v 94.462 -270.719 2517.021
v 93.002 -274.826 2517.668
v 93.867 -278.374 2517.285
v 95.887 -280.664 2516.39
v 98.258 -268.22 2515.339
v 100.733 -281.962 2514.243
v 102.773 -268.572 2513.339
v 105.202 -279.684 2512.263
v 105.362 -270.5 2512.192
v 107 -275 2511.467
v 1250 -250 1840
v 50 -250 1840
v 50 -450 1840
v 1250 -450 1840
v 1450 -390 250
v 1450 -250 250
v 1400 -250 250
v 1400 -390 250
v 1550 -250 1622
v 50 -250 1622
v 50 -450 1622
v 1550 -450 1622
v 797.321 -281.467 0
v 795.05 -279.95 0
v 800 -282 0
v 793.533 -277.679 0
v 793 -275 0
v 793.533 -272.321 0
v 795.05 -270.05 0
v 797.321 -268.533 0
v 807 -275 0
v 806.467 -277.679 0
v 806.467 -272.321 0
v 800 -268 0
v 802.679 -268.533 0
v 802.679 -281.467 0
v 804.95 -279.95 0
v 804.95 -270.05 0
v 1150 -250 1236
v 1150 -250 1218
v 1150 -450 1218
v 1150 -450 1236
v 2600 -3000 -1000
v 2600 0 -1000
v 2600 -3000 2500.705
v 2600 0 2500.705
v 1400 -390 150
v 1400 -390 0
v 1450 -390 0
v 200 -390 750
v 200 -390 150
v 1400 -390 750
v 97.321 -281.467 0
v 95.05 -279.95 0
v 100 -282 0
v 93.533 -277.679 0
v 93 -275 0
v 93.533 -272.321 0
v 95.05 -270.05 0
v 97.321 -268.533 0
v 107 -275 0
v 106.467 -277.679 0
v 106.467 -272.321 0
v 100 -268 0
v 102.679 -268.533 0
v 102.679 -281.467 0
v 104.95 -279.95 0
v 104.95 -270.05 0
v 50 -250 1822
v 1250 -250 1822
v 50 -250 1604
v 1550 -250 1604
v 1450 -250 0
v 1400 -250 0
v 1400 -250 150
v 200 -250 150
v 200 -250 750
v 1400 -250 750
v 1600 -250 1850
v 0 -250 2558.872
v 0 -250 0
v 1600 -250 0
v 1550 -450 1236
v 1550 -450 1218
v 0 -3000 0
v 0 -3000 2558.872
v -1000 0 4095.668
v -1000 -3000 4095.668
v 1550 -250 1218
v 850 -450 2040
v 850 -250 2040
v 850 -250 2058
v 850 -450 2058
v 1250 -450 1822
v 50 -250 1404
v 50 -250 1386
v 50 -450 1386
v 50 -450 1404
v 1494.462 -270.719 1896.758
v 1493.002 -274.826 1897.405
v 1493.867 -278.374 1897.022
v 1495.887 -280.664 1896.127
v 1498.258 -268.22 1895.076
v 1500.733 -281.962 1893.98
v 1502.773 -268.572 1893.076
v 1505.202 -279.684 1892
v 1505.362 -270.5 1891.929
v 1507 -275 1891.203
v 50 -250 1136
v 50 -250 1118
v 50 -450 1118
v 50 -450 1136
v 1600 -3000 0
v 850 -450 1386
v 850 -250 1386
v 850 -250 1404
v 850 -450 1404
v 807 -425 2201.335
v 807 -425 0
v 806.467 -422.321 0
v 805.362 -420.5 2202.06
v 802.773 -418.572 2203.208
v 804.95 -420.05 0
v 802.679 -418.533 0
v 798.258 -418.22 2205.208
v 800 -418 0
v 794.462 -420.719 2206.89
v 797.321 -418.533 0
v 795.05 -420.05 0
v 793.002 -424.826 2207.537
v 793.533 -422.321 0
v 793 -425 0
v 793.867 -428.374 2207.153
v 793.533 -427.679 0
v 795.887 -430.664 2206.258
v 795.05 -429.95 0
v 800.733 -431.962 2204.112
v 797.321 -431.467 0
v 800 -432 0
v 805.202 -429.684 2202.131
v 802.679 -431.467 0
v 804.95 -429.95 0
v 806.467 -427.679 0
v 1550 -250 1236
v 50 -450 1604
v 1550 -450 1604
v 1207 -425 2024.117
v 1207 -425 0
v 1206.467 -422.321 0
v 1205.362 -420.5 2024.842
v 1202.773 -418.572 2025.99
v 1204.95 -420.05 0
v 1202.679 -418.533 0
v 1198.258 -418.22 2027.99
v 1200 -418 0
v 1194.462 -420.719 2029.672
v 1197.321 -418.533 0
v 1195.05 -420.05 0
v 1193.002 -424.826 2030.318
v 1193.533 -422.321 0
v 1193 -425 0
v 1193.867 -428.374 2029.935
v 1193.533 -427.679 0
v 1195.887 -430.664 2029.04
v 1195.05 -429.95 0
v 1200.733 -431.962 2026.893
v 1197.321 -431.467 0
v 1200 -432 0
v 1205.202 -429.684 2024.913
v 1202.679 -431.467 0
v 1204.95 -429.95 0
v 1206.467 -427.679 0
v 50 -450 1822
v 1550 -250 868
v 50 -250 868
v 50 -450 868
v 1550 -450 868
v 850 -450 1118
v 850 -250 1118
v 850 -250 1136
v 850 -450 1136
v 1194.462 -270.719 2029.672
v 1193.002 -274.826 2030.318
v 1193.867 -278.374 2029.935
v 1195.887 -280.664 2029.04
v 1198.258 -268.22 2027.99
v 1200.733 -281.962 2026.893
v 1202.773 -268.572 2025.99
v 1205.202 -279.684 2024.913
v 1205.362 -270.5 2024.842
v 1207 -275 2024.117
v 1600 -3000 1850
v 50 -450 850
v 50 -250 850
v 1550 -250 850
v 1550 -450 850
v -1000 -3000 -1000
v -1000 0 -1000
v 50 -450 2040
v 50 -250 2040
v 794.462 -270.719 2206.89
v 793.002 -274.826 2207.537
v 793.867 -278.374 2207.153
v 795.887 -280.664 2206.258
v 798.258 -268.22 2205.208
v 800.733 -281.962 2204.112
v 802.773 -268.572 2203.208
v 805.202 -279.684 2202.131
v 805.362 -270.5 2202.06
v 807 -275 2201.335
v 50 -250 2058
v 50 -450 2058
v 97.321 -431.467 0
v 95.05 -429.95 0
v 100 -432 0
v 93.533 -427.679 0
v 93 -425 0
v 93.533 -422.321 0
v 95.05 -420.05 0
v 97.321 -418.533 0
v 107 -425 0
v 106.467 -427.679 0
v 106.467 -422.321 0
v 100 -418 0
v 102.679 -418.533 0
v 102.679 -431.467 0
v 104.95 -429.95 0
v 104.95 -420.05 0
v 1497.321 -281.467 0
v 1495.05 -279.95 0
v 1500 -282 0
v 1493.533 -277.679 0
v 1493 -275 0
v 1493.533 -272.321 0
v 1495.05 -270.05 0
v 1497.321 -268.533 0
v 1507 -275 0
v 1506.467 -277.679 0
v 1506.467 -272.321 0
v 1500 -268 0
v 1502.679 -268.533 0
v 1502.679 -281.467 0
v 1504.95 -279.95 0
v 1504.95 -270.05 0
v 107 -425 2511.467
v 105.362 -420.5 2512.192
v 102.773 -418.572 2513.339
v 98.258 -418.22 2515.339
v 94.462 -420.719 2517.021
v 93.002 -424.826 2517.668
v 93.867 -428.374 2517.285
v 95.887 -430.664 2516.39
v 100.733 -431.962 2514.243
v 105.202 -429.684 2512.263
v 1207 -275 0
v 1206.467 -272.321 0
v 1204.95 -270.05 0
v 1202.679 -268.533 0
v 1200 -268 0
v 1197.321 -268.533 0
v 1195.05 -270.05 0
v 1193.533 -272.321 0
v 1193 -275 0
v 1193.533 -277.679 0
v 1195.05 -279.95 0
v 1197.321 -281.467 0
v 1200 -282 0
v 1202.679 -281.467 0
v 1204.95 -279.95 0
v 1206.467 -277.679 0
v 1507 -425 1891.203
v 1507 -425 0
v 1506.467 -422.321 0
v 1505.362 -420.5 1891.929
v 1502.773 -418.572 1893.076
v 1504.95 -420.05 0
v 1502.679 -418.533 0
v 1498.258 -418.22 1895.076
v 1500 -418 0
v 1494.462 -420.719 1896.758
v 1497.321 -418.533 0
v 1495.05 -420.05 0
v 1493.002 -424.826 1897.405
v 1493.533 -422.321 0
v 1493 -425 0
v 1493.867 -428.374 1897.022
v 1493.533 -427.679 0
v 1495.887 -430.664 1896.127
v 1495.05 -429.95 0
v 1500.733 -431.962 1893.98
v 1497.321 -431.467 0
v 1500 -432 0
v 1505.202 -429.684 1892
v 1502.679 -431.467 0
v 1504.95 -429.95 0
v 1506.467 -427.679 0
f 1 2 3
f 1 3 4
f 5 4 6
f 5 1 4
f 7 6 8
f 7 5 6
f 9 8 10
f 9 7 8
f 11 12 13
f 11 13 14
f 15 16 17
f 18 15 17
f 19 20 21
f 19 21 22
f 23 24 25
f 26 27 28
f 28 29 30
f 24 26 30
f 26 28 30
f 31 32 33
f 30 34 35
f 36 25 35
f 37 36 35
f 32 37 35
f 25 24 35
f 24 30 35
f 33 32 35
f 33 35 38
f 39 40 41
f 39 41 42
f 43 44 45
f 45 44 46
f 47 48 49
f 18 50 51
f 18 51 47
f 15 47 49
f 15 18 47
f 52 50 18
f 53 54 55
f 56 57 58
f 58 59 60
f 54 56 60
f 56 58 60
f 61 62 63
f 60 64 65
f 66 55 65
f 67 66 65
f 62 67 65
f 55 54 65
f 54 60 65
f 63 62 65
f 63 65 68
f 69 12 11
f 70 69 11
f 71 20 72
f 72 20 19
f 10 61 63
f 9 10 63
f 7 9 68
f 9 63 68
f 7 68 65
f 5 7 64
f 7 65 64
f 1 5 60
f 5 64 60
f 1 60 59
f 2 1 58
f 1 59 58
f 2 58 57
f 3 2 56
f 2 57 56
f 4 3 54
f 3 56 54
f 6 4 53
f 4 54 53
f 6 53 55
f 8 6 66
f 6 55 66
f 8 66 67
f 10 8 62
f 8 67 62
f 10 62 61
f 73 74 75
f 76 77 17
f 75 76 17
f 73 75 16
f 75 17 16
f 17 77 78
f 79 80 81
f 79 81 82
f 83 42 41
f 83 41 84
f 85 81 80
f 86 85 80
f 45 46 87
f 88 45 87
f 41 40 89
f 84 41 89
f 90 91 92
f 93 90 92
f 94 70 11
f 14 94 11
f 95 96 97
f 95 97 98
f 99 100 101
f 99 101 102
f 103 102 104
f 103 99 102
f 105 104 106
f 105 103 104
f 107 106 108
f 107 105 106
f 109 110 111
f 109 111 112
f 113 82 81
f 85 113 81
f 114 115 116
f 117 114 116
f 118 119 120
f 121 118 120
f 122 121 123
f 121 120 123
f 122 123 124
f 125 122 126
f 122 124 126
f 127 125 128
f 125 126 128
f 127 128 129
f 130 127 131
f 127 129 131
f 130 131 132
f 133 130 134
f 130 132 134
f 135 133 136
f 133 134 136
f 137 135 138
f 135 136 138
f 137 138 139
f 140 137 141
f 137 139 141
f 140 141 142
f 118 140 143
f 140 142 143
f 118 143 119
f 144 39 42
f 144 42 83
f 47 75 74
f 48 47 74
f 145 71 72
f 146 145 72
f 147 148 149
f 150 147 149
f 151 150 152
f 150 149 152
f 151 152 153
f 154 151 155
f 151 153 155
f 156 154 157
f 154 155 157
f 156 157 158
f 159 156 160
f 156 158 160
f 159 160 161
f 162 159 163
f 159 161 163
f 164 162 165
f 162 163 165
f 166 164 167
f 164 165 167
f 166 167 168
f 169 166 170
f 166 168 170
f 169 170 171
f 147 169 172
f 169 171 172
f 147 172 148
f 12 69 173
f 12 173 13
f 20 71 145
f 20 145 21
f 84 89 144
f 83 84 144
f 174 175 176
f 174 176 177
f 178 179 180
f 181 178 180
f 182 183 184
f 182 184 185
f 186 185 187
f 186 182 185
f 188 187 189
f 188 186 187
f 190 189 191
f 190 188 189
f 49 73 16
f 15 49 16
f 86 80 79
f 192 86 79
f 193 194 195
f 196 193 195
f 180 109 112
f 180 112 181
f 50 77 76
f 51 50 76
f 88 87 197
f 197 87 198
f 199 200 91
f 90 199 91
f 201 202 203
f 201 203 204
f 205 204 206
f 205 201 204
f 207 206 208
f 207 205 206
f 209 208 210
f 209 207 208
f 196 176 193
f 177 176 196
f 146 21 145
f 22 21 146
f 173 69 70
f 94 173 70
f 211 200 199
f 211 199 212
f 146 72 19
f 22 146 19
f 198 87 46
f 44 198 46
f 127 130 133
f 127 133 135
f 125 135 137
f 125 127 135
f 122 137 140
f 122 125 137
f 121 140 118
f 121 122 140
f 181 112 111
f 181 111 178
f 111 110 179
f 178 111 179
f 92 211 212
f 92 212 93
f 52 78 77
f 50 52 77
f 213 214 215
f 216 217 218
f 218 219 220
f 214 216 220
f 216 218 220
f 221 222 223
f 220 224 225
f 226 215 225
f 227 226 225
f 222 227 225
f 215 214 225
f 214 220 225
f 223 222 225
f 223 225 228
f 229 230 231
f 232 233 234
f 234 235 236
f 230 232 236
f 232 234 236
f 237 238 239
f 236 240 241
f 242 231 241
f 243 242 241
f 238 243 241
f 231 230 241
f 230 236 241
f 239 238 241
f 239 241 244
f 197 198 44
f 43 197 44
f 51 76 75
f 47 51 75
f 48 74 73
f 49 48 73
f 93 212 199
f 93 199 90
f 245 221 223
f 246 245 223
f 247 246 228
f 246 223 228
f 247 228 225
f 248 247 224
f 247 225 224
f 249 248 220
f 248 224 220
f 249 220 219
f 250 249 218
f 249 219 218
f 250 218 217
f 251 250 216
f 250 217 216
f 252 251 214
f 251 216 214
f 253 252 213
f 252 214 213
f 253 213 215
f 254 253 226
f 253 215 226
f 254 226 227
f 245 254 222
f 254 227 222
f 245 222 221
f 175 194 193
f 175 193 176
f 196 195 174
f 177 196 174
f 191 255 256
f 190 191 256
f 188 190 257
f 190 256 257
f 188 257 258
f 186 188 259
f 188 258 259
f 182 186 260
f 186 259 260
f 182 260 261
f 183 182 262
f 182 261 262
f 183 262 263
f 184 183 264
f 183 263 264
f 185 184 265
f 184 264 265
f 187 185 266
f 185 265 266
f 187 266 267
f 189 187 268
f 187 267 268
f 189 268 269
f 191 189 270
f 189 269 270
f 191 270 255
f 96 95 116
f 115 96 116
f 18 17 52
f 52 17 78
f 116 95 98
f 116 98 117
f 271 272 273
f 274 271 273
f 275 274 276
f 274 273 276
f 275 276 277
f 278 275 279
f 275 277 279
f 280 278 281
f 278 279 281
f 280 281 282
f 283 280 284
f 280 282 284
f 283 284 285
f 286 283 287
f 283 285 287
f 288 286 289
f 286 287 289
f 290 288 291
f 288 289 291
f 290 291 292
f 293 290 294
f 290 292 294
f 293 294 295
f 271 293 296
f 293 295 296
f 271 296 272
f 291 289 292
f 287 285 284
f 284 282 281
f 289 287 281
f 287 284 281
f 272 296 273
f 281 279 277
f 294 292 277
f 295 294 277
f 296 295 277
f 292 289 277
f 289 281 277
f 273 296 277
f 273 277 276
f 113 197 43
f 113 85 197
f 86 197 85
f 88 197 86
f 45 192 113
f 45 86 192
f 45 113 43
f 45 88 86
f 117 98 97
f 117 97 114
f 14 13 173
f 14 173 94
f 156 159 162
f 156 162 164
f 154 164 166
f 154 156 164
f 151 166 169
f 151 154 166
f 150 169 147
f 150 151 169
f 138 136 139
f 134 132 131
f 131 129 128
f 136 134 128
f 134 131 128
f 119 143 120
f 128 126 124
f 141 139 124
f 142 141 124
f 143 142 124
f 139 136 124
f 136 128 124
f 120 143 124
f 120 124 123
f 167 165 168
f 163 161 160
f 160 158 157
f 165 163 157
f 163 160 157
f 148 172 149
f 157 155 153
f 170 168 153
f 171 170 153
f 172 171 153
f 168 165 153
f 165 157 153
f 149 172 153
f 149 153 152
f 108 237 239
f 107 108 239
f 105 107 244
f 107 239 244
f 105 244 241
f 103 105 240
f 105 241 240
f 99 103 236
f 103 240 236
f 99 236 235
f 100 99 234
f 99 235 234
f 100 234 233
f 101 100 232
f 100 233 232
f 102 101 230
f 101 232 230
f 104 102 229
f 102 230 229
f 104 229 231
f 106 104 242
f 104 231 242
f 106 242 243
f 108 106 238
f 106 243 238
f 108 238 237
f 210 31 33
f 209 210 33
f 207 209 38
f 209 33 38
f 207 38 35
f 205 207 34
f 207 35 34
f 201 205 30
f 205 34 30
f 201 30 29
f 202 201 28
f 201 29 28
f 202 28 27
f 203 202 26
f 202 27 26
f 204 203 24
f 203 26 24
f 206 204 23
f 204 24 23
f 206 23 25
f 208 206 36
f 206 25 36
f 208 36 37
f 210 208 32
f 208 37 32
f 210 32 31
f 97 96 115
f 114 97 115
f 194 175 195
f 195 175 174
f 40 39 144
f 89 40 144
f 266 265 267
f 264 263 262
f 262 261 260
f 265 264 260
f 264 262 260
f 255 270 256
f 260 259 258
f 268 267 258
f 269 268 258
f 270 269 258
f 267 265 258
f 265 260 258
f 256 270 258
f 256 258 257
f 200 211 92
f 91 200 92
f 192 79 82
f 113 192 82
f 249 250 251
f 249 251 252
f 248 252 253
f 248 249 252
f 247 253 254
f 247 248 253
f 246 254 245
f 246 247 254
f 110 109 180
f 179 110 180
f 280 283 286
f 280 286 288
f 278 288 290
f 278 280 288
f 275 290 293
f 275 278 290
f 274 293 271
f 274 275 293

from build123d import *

# Parameters (mm, degrees)
F1_DEPTH = 3000
F2_DEPTH = 250
F4_DEPTH = 140
F5_W     = 1500
F5_H     = 18
F6_DEPTH = 200
F5_W_2   = 400
F5_W_3   = 800
F5_W_4   = 1200
F7_R     = 7
F8_REACH = 4115.4675487723


with BuildPart() as f1:
    # F0 (on Front) → F1 (new body)
    with BuildSketch(Plane.XZ):
        Polygon((2600, -1000), (2600, 2500.7047850388), (-1000, 4095.6675588991), (-1000, -1000), align=None)
        Polygon((1600, 0), (0, 0), (0, 2558.8723439379), (1600, 1850), align=None, mode=Mode.SUBTRACT)
    extrude(amount=F1_DEPTH)

    # F0 (on Front) → F2 (join)
    with BuildSketch(Plane.XZ):
        Polygon((0, 2558.8723439379), (0, 0), (1600, 0), (1600, 1850), align=None)
    extrude(amount=F2_DEPTH)


with BuildPart() as f4:
    # F3 (on face) → F4 (new body)
    with BuildSketch(Plane.XZ.offset(250)):
        Polygon((1400, 750), (200, 750), (200, 150), (1400, 150), (1400, 0), (1450, 0), (1450, 250), (1400, 250), align=None)
    extrude(amount=F4_DEPTH)


with BuildPart() as f6:
    # F5 (on face) → F6 (new body)
    with BuildSketch(Plane.XZ.offset(250)):
        with Locations((800, 859)):
            Rectangle(F5_W, F5_H)
    extrude(amount=F6_DEPTH)


with BuildPart() as f6b:
    # F5 (on face) → F6, piece 2 (new body)
    with BuildSketch(Plane.XZ.offset(250)):
        with Locations((1350, 1227)):
            Rectangle(F5_W_2, F5_H)
    extrude(amount=F6_DEPTH)


with BuildPart() as f6c:
    # F5 (on face) → F6, piece 3 (new body)
    with BuildSketch(Plane.XZ.offset(250)):
        with Locations((450, 1127)):
            Rectangle(F5_W_3, F5_H)
    extrude(amount=F6_DEPTH)


with BuildPart() as f6d:
    # F5 (on face) → F6, piece 4 (new body)
    with BuildSketch(Plane.XZ.offset(250)):
        with Locations((450, 1395)):
            Rectangle(F5_W_3, F5_H)
    extrude(amount=F6_DEPTH)


with BuildPart() as f6e:
    # F5 (on face) → F6, piece 5 (new body)
    with BuildSketch(Plane.XZ.offset(250)):
        with Locations((800, 1613)):
            Rectangle(F5_W, F5_H)
    extrude(amount=F6_DEPTH)


with BuildPart() as f6f:
    # F5 (on face) → F6, piece 6 (new body)
    with BuildSketch(Plane.XZ.offset(250)):
        with Locations((450, 2049)):
            Rectangle(F5_W_3, F5_H)
    extrude(amount=F6_DEPTH)


with BuildPart() as f6g:
    # F5 (on face) → F6, piece 7 (new body)
    with BuildSketch(Plane.XZ.offset(250)):
        with Locations((650, 1831)):
            Rectangle(F5_W_4, F5_H)
    extrude(amount=F6_DEPTH)


with BuildPart() as f8:
    f8_end = f1.part.faces().sort_by_distance((800, -1625, 2204.4361719689))[0]
    # F7 (on face) → F8 (new body, up to a face of F1 that its end follows)
    with BuildSketch(Plane.XY):
        with Locations((100, -275)):
            Circle(F7_R)
    f8_long = extrude(amount=F8_REACH, mode=Mode.PRIVATE)
    add(split(f8_long, bisect_by=f8_end, keep=Keep.TOP, mode=Mode.PRIVATE))


with BuildPart() as f8b:
    f8_2_end = f1.part.faces().sort_by_distance((800, -1625, 2204.4361719689))[0]
    # F7 (on face) → F8, piece 2 (new body, up to a face of F1 that its end follows)
    with BuildSketch(Plane.XY):
        with Locations((100, -425)):
            Circle(F7_R)
    f8_2_long = extrude(amount=F8_REACH, mode=Mode.PRIVATE)
    add(split(f8_2_long, bisect_by=f8_2_end, keep=Keep.TOP, mode=Mode.PRIVATE))


with BuildPart() as f8c:
    f8_3_end = f1.part.faces().sort_by_distance((800, -1625, 2204.4361719689))[0]
    # F7 (on face) → F8, piece 3 (new body, up to a face of F1 that its end follows)
    with BuildSketch(Plane.XY):
        with Locations((1500, -425)):
            Circle(F7_R)
    f8_3_long = extrude(amount=F8_REACH, mode=Mode.PRIVATE)
    add(split(f8_3_long, bisect_by=f8_3_end, keep=Keep.TOP, mode=Mode.PRIVATE))


with BuildPart() as f8d:
    f8_4_end = f1.part.faces().sort_by_distance((800, -1625, 2204.4361719689))[0]
    # F7 (on face) → F8, piece 4 (new body, up to a face of F1 that its end follows)
    with BuildSketch(Plane.XY):
        with Locations((1500, -275)):
            Circle(F7_R)
    f8_4_long = extrude(amount=F8_REACH, mode=Mode.PRIVATE)
    add(split(f8_4_long, bisect_by=f8_4_end, keep=Keep.TOP, mode=Mode.PRIVATE))


with BuildPart() as f8e:
    f8_5_end = f1.part.faces().sort_by_distance((800, -1625, 2204.4361719689))[0]
    # F7 (on face) → F8, piece 5 (new body, up to a face of F1 that its end follows)
    with BuildSketch(Plane.XY):
        with Locations((800, -275)):
            Circle(F7_R)
    f8_5_long = extrude(amount=F8_REACH, mode=Mode.PRIVATE)
    add(split(f8_5_long, bisect_by=f8_5_end, keep=Keep.TOP, mode=Mode.PRIVATE))


with BuildPart() as f8f:
    f8_6_end = f1.part.faces().sort_by_distance((800, -1625, 2204.4361719689))[0]
    # F7 (on face) → F8, piece 6 (new body, up to a face of F1 that its end follows)
    with BuildSketch(Plane.XY):
        with Locations((800, -425)):
            Circle(F7_R)
    f8_6_long = extrude(amount=F8_REACH, mode=Mode.PRIVATE)
    add(split(f8_6_long, bisect_by=f8_6_end, keep=Keep.TOP, mode=Mode.PRIVATE))


with BuildPart() as f8g:
    f8_7_end = f1.part.faces().sort_by_distance((800, -1625, 2204.4361719689))[0]
    # F7 (on face) → F8, piece 7 (new body, up to a face of F1 that its end follows)
    with BuildSketch(Plane.XY):
        with Locations((1200, -275)):
            Circle(F7_R)
    f8_7_long = extrude(amount=F8_REACH, mode=Mode.PRIVATE)
    add(split(f8_7_long, bisect_by=f8_7_end, keep=Keep.TOP, mode=Mode.PRIVATE))


with BuildPart() as f8h:
    f8_8_end = f1.part.faces().sort_by_distance((800, -1625, 2204.4361719689))[0]
    # F7 (on face) → F8, piece 8 (new body, up to a face of F1 that its end follows)
    with BuildSketch(Plane.XY):
        with Locations((1200, -425)):
            Circle(F7_R)
    f8_8_long = extrude(amount=F8_REACH, mode=Mode.PRIVATE)
    add(split(f8_8_long, bisect_by=f8_8_end, keep=Keep.TOP, mode=Mode.PRIVATE))


solid = Compound([f1.part, f4.part, f6.part, f6b.part, f6c.part, f6d.part, f6e.part, f6f.part, f6g.part, f8.part, f8b.part, f8c.part, f8d.part, f8e.part, f8f.part, f8g.part, f8h.part])
